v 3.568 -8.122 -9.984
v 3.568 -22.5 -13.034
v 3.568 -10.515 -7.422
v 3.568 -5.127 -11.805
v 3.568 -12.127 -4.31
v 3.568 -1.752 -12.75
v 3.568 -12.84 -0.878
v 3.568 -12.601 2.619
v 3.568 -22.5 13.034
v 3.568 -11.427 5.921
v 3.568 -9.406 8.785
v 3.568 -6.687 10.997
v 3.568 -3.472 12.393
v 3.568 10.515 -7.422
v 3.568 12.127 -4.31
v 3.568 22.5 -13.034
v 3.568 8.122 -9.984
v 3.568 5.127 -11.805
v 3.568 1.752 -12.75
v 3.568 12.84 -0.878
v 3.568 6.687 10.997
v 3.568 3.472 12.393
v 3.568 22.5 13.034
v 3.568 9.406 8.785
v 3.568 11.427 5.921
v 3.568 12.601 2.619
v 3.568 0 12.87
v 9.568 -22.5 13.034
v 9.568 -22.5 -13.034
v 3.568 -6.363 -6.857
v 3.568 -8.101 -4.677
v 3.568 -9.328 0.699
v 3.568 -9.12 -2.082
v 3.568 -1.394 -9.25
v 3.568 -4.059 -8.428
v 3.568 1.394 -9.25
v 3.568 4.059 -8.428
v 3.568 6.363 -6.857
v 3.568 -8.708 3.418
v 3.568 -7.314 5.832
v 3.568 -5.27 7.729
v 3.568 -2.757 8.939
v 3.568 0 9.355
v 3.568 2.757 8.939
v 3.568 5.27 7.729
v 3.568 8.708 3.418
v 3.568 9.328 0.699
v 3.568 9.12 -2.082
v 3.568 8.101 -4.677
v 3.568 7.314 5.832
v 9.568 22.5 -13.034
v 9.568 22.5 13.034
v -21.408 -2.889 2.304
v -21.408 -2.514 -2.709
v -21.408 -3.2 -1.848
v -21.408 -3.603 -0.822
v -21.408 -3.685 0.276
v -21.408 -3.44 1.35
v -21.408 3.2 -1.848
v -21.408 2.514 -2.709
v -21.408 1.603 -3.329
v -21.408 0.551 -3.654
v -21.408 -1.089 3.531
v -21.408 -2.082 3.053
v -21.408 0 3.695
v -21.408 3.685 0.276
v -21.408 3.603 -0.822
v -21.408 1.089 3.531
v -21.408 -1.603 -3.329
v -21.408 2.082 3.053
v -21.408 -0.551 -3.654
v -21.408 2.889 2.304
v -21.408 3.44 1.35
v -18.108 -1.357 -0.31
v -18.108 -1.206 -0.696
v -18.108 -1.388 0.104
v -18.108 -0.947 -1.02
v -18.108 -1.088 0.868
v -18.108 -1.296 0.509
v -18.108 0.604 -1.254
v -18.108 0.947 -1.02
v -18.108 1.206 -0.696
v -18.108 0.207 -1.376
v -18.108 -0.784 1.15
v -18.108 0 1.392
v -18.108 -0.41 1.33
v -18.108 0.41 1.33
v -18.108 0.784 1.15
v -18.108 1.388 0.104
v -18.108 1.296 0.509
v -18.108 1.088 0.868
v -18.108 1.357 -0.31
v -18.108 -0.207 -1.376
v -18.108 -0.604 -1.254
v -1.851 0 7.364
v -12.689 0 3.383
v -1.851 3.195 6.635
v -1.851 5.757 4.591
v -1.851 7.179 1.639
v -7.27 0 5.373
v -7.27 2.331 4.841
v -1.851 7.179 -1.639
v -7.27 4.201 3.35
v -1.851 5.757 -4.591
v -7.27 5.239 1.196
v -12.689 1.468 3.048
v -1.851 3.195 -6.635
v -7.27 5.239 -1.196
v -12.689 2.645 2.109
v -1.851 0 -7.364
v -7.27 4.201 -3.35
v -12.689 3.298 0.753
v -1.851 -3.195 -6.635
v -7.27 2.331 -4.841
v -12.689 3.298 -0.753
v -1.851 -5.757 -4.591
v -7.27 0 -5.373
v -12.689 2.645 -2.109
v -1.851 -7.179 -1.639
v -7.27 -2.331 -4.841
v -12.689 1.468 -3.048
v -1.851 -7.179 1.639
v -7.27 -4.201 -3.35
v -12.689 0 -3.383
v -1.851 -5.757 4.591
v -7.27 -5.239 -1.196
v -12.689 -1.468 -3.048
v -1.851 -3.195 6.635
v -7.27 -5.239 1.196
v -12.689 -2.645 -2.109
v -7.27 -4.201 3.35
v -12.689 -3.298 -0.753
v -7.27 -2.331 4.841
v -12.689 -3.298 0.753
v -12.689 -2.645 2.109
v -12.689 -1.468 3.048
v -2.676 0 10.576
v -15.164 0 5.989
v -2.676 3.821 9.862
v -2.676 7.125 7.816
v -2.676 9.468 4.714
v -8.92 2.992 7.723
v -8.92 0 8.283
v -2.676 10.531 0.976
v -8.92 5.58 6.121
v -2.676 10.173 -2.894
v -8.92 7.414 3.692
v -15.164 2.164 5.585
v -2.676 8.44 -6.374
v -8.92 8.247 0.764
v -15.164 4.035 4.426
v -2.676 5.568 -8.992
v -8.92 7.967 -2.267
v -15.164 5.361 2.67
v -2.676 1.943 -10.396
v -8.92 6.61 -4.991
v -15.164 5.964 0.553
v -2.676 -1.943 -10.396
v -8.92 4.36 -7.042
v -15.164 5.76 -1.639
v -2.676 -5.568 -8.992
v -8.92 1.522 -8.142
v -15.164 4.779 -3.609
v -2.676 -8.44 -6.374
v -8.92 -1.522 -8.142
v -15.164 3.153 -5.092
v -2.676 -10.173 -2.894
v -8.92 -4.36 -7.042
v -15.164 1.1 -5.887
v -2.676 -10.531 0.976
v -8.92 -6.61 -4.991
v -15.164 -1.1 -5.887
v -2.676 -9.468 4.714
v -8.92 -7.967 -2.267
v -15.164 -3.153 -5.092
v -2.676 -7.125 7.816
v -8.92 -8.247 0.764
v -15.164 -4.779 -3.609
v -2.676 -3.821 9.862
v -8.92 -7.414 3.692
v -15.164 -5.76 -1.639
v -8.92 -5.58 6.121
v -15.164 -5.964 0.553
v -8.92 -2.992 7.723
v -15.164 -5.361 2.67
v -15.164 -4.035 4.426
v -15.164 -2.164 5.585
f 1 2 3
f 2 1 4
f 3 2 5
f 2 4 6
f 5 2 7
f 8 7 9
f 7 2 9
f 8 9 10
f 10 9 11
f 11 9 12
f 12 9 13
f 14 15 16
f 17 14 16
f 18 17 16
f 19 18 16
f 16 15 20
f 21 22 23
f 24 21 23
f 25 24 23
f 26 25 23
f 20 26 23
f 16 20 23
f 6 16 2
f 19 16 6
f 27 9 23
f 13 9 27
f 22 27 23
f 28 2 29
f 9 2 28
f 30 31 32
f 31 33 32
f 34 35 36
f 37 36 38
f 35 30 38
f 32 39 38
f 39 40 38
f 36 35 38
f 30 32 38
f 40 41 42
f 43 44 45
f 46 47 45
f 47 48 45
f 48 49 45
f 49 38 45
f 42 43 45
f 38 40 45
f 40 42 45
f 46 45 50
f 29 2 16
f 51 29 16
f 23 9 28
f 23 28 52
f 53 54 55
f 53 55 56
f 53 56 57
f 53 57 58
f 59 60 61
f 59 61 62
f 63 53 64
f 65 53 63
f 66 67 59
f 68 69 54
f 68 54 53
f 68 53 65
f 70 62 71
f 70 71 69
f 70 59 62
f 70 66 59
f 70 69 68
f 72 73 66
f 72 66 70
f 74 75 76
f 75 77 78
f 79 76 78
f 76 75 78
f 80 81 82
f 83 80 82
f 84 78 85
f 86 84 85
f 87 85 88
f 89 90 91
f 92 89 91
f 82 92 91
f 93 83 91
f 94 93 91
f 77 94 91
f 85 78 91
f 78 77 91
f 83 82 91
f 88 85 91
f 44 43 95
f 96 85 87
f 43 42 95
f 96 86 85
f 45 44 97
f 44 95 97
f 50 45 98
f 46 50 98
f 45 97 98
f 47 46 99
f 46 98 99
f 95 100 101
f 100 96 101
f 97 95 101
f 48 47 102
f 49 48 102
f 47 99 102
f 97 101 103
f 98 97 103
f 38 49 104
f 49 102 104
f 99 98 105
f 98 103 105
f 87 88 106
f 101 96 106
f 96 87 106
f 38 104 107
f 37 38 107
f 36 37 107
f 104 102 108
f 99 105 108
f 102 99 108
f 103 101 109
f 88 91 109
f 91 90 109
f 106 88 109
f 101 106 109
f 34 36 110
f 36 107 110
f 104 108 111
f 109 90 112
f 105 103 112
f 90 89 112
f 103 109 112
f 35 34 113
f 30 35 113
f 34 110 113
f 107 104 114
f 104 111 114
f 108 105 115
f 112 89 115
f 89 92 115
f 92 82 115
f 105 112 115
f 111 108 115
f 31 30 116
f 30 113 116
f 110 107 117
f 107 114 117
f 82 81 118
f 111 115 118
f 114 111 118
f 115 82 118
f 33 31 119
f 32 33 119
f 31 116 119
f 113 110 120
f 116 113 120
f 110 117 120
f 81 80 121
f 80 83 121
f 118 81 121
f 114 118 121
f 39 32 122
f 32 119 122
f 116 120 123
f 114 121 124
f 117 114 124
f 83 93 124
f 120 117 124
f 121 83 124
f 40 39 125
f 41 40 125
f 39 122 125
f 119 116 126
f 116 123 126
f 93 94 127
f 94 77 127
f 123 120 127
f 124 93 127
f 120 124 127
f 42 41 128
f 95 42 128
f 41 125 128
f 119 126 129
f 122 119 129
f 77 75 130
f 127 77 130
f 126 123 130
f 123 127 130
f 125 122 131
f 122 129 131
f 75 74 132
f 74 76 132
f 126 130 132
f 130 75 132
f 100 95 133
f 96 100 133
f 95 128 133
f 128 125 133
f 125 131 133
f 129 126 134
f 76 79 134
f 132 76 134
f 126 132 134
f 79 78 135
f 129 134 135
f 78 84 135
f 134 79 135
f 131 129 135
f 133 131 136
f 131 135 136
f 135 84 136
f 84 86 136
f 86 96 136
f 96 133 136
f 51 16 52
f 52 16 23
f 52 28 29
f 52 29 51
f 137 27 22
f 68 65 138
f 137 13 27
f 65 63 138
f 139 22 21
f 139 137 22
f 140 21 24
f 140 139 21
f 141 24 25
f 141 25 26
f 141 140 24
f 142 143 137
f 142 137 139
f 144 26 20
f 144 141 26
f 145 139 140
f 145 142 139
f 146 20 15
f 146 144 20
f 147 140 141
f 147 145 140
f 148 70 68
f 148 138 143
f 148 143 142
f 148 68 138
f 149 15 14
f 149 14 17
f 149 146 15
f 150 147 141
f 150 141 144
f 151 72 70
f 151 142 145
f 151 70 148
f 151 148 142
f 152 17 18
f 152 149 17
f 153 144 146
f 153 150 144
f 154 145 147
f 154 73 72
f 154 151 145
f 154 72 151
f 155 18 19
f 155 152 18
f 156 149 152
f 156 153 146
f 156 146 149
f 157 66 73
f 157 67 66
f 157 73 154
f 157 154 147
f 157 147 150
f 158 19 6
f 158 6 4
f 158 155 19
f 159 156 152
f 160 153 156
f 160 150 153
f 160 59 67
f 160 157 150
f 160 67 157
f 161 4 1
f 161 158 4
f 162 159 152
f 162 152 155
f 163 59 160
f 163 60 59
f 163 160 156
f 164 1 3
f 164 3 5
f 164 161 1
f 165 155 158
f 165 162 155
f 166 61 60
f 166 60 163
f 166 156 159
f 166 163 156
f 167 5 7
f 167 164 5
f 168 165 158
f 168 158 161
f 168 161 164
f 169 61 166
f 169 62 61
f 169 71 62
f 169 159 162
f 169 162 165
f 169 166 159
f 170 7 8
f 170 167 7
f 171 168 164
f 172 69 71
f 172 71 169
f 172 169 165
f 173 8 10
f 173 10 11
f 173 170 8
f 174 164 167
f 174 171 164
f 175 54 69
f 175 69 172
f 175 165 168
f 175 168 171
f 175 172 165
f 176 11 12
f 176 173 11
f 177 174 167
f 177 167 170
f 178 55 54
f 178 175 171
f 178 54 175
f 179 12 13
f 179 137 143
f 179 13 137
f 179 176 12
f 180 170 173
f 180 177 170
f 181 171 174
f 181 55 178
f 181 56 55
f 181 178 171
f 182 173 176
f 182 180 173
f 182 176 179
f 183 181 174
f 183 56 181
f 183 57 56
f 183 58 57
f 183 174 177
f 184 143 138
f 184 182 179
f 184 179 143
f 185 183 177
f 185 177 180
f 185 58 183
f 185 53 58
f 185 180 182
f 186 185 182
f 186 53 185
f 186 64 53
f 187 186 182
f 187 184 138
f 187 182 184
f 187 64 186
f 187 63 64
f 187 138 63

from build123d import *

# Parameters (mm, degrees)
F2_T     = -3.3
F3_W     = 45
F3_H     = 26.067962
F4_DEPTH = 6


with BuildPart() as f1:
    # F0 (on Front) → F1 (revolve)
    with BuildSketch(Plane.XZ):
        Polygon((-21.407768, 3.695389), (-21.407768, 0), (3.567961, 0), (3.567961, 12.870146), align=None)
    revolve(axis=Axis((-8.919903, 0, 0), (-1, 0, 0)))

    # F2
    f2_openings = [f1.faces().sort_by_distance(p)[0] for p in [
        (3.567961, 0, 0),
    ]]
    offset(amount=F2_T, openings=f2_openings)

    # F3 (on face) → F4 (join)
    with BuildSketch(Plane.YZ.offset(3.567961)):
        Rectangle(F3_W, F3_H)
    extrude(amount=F4_DEPTH)


solid = f1.part
